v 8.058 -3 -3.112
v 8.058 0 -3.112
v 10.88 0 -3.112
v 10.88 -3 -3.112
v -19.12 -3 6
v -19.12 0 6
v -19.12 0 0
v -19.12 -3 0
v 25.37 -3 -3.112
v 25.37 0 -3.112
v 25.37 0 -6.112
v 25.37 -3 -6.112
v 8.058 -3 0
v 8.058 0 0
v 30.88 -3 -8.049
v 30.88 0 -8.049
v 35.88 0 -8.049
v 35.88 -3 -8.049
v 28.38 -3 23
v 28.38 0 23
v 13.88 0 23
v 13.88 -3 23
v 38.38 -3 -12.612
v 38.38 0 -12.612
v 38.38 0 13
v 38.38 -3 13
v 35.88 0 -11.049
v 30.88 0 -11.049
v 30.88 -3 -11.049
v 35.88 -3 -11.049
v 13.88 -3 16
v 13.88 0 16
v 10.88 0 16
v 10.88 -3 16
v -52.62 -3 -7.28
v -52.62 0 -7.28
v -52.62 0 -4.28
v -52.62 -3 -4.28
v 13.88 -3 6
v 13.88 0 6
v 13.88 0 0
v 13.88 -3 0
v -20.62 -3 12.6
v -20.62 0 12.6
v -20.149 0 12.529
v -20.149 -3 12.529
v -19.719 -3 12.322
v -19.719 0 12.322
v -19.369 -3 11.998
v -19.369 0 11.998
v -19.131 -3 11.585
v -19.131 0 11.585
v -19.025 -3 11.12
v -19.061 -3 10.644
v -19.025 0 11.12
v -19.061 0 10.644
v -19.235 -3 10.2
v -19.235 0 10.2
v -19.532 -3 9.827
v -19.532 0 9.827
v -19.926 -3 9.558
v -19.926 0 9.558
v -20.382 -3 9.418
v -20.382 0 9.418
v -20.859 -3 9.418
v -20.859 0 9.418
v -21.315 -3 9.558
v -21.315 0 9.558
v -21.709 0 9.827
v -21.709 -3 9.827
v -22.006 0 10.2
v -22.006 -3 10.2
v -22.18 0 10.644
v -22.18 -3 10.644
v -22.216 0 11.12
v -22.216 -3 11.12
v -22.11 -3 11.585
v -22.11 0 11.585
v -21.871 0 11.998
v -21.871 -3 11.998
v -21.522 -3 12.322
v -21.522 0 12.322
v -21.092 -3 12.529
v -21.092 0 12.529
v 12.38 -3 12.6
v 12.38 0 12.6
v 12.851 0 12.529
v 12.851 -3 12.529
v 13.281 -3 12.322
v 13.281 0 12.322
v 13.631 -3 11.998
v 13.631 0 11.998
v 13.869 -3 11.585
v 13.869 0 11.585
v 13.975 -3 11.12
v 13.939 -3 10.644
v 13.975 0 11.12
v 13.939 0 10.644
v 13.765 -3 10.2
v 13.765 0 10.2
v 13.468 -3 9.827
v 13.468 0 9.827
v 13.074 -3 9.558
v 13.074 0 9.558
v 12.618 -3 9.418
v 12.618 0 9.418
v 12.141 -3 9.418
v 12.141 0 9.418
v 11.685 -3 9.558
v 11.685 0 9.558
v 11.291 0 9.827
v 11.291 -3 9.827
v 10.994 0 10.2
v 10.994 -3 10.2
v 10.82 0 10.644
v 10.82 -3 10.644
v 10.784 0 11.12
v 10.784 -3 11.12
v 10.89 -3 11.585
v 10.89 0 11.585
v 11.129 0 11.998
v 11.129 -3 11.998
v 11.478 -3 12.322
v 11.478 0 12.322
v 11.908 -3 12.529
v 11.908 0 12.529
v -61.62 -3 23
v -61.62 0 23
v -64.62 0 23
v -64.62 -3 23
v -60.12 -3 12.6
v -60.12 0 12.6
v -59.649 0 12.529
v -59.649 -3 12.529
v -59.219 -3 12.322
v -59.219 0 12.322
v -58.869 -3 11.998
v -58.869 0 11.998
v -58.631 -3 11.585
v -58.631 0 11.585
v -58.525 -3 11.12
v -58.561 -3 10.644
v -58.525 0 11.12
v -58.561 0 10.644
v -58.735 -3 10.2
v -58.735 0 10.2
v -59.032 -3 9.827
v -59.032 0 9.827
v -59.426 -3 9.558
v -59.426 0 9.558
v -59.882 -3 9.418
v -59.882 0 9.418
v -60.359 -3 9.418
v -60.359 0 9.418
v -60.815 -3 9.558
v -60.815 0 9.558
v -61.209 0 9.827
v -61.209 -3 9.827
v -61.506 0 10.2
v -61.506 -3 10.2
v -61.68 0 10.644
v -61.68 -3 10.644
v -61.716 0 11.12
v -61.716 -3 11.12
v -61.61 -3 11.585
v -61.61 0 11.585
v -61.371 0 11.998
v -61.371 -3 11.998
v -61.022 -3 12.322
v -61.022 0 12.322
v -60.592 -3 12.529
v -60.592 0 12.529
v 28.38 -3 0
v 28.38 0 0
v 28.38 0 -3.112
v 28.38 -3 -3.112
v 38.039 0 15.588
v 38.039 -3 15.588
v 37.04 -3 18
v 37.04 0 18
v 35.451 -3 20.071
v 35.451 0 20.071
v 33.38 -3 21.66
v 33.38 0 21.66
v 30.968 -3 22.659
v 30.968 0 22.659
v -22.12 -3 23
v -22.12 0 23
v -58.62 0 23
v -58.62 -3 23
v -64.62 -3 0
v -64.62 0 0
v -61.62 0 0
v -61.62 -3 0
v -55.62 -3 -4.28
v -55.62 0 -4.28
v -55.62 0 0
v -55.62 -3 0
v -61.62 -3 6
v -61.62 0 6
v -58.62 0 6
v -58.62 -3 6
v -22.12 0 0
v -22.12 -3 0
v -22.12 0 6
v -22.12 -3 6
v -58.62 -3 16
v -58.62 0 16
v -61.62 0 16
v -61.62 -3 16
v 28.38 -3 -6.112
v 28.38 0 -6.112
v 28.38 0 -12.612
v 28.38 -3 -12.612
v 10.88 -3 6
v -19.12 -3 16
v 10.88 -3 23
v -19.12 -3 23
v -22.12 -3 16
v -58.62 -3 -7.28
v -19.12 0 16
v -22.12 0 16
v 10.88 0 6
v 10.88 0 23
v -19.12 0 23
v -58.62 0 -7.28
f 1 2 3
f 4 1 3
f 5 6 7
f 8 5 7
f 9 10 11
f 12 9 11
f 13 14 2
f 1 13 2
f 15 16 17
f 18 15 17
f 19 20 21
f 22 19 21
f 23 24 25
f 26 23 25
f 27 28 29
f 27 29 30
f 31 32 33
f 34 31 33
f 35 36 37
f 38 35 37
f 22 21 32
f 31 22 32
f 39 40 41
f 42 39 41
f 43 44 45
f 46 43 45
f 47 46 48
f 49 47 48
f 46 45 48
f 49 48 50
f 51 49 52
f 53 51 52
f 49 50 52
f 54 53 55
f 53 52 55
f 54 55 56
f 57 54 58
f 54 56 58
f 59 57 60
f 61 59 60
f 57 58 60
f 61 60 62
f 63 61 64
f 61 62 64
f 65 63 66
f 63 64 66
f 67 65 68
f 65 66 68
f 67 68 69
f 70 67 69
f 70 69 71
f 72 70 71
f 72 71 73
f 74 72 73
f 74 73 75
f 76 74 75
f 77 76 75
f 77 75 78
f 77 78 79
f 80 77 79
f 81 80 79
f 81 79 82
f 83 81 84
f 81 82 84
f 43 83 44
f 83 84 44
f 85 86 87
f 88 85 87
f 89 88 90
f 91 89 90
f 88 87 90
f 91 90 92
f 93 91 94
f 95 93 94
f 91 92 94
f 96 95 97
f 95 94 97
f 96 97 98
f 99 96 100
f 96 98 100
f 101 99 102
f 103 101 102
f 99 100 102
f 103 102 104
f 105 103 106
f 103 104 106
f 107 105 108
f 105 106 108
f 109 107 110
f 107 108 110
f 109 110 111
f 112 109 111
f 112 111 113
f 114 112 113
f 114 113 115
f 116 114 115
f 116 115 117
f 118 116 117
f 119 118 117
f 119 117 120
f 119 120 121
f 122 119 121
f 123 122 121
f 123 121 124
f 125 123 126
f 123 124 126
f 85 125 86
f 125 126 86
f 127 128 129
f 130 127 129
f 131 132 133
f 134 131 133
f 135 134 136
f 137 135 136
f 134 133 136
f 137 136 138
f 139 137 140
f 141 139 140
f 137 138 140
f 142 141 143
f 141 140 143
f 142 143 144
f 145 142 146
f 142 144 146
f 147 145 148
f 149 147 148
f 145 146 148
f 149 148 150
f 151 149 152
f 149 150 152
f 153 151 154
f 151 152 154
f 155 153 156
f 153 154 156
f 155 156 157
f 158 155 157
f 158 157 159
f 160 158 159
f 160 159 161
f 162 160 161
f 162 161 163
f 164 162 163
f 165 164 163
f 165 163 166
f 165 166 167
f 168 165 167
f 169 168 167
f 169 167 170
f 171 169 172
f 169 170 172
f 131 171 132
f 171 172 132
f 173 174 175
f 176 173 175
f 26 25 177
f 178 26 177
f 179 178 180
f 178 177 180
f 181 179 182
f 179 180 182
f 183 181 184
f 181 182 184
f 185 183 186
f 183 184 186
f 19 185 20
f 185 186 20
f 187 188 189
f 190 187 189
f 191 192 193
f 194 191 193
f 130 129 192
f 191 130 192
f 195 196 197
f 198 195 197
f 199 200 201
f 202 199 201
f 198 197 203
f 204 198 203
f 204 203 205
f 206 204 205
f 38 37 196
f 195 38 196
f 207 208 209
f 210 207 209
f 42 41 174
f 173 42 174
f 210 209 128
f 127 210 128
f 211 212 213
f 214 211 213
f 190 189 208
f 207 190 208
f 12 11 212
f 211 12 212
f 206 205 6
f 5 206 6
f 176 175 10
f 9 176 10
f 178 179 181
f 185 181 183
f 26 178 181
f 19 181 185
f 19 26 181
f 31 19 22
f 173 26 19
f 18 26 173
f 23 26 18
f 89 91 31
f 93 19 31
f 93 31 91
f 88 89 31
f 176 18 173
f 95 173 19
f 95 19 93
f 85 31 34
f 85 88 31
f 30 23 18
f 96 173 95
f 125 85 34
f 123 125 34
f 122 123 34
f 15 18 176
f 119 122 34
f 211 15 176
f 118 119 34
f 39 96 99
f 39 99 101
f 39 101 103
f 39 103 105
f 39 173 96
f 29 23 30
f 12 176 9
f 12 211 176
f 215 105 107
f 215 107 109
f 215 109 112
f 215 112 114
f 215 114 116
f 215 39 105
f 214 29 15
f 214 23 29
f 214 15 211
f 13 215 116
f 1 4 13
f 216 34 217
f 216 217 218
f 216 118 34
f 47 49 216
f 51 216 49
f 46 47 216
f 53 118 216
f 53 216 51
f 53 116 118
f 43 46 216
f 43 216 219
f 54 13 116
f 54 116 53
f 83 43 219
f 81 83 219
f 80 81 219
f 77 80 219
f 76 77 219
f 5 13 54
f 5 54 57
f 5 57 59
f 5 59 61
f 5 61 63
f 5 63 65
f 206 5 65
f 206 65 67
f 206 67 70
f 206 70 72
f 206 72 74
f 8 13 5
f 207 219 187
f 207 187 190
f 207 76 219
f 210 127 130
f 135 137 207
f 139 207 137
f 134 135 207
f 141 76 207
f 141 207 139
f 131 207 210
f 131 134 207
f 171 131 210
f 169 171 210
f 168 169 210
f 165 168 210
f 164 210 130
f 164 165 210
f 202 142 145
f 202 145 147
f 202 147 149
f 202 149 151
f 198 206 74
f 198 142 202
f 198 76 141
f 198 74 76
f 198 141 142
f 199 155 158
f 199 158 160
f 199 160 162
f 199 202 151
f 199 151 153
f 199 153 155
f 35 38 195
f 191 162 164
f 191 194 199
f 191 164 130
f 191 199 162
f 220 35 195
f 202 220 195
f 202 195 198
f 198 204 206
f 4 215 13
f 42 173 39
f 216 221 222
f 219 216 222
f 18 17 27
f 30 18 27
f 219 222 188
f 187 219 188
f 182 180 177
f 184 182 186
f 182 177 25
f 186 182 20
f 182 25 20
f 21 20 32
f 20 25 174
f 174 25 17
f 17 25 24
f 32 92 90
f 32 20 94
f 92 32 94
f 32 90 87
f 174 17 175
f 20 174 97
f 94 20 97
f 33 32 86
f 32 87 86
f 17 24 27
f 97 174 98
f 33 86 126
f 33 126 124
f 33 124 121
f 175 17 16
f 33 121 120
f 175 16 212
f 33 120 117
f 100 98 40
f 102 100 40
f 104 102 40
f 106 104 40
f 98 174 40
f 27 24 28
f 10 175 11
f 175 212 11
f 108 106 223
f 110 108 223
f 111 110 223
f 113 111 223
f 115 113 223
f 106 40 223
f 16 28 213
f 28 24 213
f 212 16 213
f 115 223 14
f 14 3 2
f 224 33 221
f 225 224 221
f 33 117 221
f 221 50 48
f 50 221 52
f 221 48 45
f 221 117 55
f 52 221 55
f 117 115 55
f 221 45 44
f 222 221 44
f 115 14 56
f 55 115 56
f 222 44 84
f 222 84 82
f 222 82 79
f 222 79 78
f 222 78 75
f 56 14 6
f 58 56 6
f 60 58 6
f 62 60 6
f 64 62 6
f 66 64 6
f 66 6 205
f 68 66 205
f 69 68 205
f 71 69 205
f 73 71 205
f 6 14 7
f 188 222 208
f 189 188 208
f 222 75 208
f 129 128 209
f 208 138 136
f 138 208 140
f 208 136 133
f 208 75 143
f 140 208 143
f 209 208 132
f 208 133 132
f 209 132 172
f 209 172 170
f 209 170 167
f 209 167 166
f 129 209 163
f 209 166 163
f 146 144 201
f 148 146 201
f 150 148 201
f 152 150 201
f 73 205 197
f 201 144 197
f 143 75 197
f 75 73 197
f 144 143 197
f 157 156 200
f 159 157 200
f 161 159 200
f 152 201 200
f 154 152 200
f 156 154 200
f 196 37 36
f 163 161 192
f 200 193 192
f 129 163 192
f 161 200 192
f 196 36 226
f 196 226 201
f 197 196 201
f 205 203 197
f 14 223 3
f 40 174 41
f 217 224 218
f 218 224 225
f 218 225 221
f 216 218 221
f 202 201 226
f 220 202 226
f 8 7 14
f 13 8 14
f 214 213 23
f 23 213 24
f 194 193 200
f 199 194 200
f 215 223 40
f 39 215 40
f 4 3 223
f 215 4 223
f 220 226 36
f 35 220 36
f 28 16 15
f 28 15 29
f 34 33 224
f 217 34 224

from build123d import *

# Parameters (mm, degrees)
SKETCH_1_R      = 1.6
SKETCH_1_W      = 5
SKETCH_1_H      = 3
EXTRUDE_3_DEPTH = 3


with BuildPart() as part:
    # 草图1 → 凸台-拉伸3 (new body)
    with BuildSketch(Plane(origin=(0, 0, 0), x_dir=(1, 0, 0), z_dir=(0, 1, 0))):
        with BuildLine():
            Line((-64.620407451, -23), (-64.620407451, 0))
            Line((-64.620407451, 0), (-61.620407451, 0))
            Line((-61.620407451, 0), (-61.620407451, -6))
            Line((-61.620407451, -6), (-58.620407451, -6))
            Line((-58.620407451, -6), (-58.620407451, 7.279592288))
            Line((-58.620407451, 7.279592288), (-52.620407451, 7.279592288))
            Line((-52.620407451, 7.279592288), (-52.620407451, 4.279592288))
            Line((-52.620407451, 4.279592288), (-55.620407451, 4.279592288))
            Line((-55.620407451, 4.279592288), (-55.620407451, 0))
            Line((-55.620407451, 0), (-22.120407451, 0))
            Line((-22.120407451, 0), (-22.120407451, -6))
            Line((-22.120407451, -6), (-19.120407451, -6))
            Line((-19.120407451, -6), (-19.120407451, 0))
            Line((-19.120407451, 0), (8.058394468, 0))
            Line((8.058394468, 0), (8.058394468, 3.112438553))
            Line((8.058394468, 3.112438553), (10.879592549, 3.112438553))
            Line((10.879592549, 3.112438553), (10.879592549, -6))
            Line((10.879592549, -6), (13.879592549, -6))
            Line((13.879592549, -6), (13.879592549, 0))
            Line((13.879592549, 0), (28.379592549, 0))
            Line((28.379592549, 0), (28.379592549, 3.112438553))
            Line((28.379592549, 3.112438553), (25.370412077, 3.112438553))
            Line((25.370412077, 3.112438553), (25.370412077, 6.112438553))
            Line((25.370412077, 6.112438553), (28.379592549, 6.112438553))
            Line((28.379592549, 6.112438553), (28.379592549, 12.612438553))
            Line((28.379592549, 12.612438553), (38.379592549, 12.612438553))
            Line((38.379592549, 12.612438553), (38.379592549, -13))
            ThreePointArc((38.379592549, -13), (35.450660361, -20.071067812), (28.379592549, -23))
            Line((28.379592549, -23), (13.879592549, -23))
            Line((13.879592549, -23), (13.879592549, -16))
            Line((13.879592549, -16), (10.879592549, -16))
            Line((10.879592549, -16), (10.879592549, -23))
            Line((10.879592549, -23), (-19.120407451, -23))
            Line((-19.120407451, -23), (-19.120407451, -16))
            Line((-19.120407451, -16), (-22.120407451, -16))
            Line((-22.120407451, -16), (-22.120407451, -23))
            Line((-22.120407451, -23), (-58.620407451, -23))
            Line((-58.620407451, -23), (-58.620407451, -16))
            Line((-58.620407451, -16), (-61.620407451, -16))
            Line((-61.620407451, -16), (-61.620407451, -23))
            Line((-61.620407451, -23), (-64.620407451, -23))
        make_face()
        with Locations(Location((-60.120407451, -11, 0), (0, 0, 270))):
            Circle(SKETCH_1_R, mode=Mode.SUBTRACT)
        with Locations(Location((-20.620407451, -11, 0), (0, 0, 270))):
            Circle(SKETCH_1_R, mode=Mode.SUBTRACT)
        with Locations(Location((12.379592549, -11, 0), (0, 0, 270))):
            Circle(SKETCH_1_R, mode=Mode.SUBTRACT)
        with Locations((33.379592549, 9.548629934)):
            Rectangle(SKETCH_1_W, SKETCH_1_H, mode=Mode.SUBTRACT)
    extrude(amount=-EXTRUDE_3_DEPTH)


solid = part.part
